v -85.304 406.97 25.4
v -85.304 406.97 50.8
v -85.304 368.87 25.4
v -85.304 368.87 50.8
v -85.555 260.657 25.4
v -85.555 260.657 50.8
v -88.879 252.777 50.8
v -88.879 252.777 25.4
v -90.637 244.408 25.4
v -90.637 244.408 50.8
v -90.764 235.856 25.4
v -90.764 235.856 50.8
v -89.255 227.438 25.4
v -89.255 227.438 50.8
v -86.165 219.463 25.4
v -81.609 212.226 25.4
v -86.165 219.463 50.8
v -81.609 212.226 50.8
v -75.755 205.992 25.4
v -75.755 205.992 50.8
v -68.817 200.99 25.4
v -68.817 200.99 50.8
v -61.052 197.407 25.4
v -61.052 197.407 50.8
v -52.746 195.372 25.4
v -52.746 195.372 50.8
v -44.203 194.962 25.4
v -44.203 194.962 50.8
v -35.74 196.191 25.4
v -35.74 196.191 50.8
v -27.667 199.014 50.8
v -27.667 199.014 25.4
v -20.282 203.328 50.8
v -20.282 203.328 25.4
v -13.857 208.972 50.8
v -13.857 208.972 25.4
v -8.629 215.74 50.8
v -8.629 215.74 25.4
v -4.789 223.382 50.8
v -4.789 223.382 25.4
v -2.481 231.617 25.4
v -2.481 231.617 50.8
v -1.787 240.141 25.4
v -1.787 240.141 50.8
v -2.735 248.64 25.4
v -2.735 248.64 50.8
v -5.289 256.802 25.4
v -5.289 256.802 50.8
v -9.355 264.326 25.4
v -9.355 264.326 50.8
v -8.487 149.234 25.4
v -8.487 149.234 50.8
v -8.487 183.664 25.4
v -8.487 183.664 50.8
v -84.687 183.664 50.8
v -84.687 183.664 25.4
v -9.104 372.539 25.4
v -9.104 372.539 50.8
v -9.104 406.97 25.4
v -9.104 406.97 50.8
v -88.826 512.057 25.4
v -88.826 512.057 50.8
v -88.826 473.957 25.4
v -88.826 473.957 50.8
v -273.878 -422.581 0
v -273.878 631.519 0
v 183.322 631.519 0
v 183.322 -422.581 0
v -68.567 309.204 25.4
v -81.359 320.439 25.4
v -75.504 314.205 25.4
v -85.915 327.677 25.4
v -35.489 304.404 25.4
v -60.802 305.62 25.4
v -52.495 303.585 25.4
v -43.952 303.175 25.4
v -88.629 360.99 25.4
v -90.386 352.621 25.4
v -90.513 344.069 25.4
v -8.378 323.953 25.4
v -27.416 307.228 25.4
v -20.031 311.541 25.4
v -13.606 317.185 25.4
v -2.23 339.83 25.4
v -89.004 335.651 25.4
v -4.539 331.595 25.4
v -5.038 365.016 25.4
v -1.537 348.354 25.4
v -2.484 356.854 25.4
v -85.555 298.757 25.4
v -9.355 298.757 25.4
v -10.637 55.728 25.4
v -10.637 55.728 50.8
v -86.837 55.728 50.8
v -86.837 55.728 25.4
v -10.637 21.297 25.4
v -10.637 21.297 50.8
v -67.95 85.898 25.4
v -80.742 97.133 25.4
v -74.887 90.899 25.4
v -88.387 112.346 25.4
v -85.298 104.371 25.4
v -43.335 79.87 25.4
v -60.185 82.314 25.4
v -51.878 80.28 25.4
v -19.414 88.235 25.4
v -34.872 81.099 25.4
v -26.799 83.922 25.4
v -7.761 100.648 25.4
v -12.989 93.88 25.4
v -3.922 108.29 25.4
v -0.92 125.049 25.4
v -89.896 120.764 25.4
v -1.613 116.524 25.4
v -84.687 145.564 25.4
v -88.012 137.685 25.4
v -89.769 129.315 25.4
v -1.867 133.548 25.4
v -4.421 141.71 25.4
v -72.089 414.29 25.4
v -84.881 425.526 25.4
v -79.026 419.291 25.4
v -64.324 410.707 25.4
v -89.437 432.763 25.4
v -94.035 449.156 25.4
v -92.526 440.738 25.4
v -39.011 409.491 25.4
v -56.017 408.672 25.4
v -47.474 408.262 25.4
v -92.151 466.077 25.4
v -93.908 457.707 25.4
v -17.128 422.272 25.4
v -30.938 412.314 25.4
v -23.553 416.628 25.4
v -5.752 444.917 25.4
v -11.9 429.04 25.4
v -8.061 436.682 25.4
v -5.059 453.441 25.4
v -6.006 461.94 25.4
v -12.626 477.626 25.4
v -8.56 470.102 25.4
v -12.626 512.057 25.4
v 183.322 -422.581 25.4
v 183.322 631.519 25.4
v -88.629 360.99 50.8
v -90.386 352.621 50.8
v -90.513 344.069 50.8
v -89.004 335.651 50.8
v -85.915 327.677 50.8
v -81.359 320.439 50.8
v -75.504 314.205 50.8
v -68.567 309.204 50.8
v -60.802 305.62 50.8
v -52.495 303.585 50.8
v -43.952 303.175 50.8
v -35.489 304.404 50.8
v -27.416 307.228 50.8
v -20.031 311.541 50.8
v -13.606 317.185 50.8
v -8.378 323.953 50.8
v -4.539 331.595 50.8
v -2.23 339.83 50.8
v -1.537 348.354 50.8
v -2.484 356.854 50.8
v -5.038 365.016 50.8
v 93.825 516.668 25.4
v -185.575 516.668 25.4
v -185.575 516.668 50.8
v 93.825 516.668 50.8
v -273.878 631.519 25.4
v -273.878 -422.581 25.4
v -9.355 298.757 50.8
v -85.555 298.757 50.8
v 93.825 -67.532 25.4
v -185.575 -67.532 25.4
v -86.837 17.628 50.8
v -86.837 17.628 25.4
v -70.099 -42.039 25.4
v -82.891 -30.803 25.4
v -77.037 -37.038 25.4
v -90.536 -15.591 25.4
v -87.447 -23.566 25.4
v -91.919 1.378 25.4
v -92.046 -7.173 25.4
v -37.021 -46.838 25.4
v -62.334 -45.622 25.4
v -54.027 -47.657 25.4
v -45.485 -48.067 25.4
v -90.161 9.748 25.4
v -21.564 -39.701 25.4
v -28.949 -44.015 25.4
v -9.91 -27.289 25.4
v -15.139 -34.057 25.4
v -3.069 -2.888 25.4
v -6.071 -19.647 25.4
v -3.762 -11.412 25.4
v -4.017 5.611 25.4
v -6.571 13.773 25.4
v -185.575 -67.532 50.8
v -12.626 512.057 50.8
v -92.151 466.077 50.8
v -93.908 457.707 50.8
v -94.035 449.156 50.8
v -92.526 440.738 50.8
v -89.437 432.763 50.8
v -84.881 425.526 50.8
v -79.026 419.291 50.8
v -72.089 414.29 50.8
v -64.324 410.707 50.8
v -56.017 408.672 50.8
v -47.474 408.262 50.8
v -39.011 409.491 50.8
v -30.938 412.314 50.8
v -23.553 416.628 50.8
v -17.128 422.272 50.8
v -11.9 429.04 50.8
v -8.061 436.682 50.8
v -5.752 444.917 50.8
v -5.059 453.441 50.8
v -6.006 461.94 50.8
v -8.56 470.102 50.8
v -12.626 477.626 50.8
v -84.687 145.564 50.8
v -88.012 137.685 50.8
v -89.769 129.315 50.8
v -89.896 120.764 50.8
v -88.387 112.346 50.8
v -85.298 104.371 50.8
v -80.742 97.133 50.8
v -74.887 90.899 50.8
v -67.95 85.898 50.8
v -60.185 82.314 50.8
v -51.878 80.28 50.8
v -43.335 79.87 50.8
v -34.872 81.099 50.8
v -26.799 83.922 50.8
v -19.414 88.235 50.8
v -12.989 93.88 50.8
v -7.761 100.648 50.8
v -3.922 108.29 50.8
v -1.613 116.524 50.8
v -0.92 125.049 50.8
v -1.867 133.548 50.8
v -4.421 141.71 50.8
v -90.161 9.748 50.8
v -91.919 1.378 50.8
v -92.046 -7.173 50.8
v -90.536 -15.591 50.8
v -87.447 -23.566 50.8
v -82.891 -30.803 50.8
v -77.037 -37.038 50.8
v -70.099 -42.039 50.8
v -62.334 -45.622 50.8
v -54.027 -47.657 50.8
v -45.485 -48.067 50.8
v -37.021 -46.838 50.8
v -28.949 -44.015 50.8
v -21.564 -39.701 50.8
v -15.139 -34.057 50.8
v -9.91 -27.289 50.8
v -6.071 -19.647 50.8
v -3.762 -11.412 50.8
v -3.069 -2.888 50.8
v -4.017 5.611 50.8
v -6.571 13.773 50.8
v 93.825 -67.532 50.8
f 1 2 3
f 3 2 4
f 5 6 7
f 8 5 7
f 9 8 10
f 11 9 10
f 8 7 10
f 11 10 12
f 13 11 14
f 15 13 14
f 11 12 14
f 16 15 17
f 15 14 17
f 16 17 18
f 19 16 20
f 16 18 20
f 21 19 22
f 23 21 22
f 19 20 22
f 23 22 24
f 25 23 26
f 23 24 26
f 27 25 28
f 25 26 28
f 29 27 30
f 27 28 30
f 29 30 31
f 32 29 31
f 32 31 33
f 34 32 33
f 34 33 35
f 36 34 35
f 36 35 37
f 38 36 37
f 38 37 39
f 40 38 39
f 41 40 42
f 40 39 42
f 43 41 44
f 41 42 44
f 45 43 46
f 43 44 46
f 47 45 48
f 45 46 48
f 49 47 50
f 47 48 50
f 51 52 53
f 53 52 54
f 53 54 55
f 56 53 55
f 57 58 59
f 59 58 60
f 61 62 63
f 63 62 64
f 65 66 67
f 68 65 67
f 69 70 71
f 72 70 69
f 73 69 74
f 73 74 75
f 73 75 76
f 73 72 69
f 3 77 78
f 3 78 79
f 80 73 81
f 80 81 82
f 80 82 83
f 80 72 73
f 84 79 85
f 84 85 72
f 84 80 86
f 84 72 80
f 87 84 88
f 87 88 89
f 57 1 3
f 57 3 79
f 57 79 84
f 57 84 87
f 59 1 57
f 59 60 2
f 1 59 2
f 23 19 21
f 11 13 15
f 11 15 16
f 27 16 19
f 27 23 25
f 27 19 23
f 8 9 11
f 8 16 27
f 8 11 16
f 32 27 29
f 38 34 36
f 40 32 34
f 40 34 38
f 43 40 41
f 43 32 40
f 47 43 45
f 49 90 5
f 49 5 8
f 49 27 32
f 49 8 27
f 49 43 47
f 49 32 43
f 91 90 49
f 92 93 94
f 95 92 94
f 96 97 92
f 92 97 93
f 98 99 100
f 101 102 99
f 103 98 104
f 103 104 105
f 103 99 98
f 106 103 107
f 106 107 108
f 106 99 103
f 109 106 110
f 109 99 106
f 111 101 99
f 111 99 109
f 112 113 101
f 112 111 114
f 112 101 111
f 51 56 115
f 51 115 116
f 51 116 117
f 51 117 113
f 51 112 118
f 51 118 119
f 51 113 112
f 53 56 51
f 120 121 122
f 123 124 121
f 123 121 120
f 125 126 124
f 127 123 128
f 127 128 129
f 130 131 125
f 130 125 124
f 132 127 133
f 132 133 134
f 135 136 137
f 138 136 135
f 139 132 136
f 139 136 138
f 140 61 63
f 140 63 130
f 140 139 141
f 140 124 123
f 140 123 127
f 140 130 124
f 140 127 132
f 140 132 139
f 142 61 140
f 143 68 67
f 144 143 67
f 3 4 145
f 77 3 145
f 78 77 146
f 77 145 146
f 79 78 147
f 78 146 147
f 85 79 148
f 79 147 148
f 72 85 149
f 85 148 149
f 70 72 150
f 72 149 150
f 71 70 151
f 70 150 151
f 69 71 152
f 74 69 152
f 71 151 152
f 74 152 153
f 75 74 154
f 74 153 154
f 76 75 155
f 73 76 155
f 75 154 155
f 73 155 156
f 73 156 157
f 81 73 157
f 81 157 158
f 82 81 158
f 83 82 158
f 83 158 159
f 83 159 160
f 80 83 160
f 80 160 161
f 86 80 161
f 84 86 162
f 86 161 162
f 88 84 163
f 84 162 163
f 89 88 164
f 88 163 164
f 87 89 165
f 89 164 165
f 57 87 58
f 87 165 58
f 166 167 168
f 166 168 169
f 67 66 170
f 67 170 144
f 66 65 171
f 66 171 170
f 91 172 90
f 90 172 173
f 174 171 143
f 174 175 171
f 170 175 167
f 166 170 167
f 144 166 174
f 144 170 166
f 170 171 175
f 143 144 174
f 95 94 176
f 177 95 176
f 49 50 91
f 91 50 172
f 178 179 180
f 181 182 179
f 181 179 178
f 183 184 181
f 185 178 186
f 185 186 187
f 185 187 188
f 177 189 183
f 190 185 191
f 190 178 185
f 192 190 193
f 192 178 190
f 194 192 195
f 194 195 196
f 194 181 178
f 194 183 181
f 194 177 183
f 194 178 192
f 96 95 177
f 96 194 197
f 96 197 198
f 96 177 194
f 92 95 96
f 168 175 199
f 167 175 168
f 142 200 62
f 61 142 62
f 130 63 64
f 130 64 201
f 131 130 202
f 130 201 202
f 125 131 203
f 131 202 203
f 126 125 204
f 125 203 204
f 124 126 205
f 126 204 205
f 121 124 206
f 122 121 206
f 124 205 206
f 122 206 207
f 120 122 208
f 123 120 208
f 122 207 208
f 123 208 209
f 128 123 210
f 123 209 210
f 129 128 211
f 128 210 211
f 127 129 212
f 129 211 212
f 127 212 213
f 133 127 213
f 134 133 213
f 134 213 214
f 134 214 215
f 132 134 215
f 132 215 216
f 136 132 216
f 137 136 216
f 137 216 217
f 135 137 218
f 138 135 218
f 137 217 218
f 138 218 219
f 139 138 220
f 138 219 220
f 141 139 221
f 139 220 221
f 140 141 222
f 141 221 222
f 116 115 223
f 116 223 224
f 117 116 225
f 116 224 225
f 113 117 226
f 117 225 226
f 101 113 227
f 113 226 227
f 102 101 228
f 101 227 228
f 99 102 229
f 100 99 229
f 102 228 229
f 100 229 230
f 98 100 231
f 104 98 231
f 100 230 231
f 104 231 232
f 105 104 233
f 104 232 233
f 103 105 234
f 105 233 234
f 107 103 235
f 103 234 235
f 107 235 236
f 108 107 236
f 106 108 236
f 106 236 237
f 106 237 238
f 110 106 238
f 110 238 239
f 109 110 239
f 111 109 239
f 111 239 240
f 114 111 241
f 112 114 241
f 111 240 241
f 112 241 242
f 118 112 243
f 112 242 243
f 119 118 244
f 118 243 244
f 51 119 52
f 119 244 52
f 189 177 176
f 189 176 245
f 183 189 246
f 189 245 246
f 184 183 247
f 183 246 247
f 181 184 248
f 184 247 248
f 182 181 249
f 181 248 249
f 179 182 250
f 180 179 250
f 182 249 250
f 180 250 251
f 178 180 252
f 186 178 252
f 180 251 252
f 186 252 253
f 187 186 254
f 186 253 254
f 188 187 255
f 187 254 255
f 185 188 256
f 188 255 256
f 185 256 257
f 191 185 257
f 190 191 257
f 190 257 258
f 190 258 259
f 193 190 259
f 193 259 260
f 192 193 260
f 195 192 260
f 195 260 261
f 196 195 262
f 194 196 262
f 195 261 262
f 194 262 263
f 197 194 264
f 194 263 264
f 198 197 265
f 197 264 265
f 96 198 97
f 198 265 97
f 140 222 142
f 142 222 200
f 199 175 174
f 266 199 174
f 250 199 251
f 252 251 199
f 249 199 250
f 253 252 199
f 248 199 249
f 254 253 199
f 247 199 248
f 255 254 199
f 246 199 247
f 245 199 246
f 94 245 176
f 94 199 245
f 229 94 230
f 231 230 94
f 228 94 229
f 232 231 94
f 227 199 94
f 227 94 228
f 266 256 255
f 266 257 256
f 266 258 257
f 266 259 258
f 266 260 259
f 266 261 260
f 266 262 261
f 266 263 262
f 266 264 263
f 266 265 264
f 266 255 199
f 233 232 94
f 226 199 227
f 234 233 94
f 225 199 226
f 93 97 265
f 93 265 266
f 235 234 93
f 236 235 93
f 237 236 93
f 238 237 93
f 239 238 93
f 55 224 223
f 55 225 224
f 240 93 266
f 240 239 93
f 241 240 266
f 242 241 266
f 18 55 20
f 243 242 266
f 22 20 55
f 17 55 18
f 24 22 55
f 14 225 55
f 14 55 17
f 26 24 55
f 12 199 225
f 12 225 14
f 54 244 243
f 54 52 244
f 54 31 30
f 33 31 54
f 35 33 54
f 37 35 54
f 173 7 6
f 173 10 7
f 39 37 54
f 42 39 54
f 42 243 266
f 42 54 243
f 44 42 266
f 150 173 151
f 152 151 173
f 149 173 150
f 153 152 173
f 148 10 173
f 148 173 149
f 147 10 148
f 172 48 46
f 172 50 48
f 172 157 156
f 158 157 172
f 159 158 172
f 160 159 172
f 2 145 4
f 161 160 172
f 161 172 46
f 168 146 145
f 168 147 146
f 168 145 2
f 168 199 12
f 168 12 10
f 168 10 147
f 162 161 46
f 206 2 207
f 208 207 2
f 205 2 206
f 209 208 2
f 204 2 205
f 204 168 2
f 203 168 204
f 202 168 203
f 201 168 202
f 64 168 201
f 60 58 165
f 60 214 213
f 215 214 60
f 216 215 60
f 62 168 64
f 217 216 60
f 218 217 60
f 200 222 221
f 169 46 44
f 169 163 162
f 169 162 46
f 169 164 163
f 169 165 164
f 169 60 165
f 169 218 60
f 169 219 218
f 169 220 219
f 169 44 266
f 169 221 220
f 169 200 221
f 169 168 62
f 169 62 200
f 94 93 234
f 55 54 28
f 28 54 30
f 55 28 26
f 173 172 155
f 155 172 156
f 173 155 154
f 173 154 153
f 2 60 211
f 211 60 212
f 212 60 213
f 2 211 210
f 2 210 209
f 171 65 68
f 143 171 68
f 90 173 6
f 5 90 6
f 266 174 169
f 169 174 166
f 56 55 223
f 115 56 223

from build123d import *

# Parameters (mm, degrees)
F0_W     = 457.2
F0_H     = 1054.1
F1_DEPTH = 25.4
F2_W     = 279.4
F2_H     = 584.2
F3_DEPTH = 25.4
F5_DEPTH = 25.4


with BuildPart() as f1:
    # F0 (on Top) → F1 (new body)
    with BuildSketch(Plane.XY):
        with Locations((-45.277641, 104.469)):
            Rectangle(F0_W, F0_H)
    extrude(amount=F1_DEPTH)

    # F2 (on face) → F3 (join)
    with BuildSketch(Plane.XY.offset(25.4)):
        with Locations((-45.87521, 224.568032)):
            Rectangle(F2_W, F2_H)
    extrude(amount=F3_DEPTH)

    # F4 (on face) → F5 (cut)
    with BuildSketch(Plane.XY.offset(50.8)):
        with BuildLine():
            Line((-86.836747, 55.727709), (-86.836747, 17.627709))
            ThreePointArc((-86.836747, 17.627709), (-45.484862, -48.067084), (-10.636747, 21.297123))
            Line((-10.636747, 21.297123), (-10.636747, 55.727709))
            Line((-10.636747, 55.727709), (-86.836747, 55.727709))
        make_face()
        with BuildLine():
            Line((-84.68732, 183.664479), (-84.68732, 145.564479))
            ThreePointArc((-84.68732, 145.564479), (-43.335435, 79.869686), (-8.48732, 149.233893))
            Line((-8.48732, 149.233893), (-8.48732, 183.664479))
            Line((-8.48732, 183.664479), (-84.68732, 183.664479))
        make_face()
        with BuildLine():
            Line((-85.555011, 298.756876), (-85.555011, 260.656876))
            ThreePointArc((-85.555011, 260.656876), (-44.203125, 194.962082), (-9.355011, 264.32629))
            Line((-9.355011, 264.32629), (-9.355011, 298.756876))
            Line((-9.355011, 298.756876), (-85.555011, 298.756876))
        make_face()
        with BuildLine():
            Line((-85.304319, 406.970002), (-85.304319, 368.870002))
            ThreePointArc((-85.304319, 368.870002), (-43.952433, 303.175209), (-9.104319, 372.539416))
            Line((-9.104319, 372.539416), (-9.104319, 406.970002))
            Line((-9.104319, 406.970002), (-85.304319, 406.970002))
        make_face()
        with BuildLine():
            Line((-88.826308, 512.056686), (-88.826308, 473.956686))
            ThreePointArc((-88.826308, 473.956686), (-47.474423, 408.261893), (-12.626308, 477.6261))
            Line((-12.626308, 477.6261), (-12.626308, 512.056686))
            Line((-12.626308, 512.056686), (-88.826308, 512.056686))
        make_face()
    extrude(amount=-F5_DEPTH, mode=Mode.SUBTRACT)


solid = f1.part
